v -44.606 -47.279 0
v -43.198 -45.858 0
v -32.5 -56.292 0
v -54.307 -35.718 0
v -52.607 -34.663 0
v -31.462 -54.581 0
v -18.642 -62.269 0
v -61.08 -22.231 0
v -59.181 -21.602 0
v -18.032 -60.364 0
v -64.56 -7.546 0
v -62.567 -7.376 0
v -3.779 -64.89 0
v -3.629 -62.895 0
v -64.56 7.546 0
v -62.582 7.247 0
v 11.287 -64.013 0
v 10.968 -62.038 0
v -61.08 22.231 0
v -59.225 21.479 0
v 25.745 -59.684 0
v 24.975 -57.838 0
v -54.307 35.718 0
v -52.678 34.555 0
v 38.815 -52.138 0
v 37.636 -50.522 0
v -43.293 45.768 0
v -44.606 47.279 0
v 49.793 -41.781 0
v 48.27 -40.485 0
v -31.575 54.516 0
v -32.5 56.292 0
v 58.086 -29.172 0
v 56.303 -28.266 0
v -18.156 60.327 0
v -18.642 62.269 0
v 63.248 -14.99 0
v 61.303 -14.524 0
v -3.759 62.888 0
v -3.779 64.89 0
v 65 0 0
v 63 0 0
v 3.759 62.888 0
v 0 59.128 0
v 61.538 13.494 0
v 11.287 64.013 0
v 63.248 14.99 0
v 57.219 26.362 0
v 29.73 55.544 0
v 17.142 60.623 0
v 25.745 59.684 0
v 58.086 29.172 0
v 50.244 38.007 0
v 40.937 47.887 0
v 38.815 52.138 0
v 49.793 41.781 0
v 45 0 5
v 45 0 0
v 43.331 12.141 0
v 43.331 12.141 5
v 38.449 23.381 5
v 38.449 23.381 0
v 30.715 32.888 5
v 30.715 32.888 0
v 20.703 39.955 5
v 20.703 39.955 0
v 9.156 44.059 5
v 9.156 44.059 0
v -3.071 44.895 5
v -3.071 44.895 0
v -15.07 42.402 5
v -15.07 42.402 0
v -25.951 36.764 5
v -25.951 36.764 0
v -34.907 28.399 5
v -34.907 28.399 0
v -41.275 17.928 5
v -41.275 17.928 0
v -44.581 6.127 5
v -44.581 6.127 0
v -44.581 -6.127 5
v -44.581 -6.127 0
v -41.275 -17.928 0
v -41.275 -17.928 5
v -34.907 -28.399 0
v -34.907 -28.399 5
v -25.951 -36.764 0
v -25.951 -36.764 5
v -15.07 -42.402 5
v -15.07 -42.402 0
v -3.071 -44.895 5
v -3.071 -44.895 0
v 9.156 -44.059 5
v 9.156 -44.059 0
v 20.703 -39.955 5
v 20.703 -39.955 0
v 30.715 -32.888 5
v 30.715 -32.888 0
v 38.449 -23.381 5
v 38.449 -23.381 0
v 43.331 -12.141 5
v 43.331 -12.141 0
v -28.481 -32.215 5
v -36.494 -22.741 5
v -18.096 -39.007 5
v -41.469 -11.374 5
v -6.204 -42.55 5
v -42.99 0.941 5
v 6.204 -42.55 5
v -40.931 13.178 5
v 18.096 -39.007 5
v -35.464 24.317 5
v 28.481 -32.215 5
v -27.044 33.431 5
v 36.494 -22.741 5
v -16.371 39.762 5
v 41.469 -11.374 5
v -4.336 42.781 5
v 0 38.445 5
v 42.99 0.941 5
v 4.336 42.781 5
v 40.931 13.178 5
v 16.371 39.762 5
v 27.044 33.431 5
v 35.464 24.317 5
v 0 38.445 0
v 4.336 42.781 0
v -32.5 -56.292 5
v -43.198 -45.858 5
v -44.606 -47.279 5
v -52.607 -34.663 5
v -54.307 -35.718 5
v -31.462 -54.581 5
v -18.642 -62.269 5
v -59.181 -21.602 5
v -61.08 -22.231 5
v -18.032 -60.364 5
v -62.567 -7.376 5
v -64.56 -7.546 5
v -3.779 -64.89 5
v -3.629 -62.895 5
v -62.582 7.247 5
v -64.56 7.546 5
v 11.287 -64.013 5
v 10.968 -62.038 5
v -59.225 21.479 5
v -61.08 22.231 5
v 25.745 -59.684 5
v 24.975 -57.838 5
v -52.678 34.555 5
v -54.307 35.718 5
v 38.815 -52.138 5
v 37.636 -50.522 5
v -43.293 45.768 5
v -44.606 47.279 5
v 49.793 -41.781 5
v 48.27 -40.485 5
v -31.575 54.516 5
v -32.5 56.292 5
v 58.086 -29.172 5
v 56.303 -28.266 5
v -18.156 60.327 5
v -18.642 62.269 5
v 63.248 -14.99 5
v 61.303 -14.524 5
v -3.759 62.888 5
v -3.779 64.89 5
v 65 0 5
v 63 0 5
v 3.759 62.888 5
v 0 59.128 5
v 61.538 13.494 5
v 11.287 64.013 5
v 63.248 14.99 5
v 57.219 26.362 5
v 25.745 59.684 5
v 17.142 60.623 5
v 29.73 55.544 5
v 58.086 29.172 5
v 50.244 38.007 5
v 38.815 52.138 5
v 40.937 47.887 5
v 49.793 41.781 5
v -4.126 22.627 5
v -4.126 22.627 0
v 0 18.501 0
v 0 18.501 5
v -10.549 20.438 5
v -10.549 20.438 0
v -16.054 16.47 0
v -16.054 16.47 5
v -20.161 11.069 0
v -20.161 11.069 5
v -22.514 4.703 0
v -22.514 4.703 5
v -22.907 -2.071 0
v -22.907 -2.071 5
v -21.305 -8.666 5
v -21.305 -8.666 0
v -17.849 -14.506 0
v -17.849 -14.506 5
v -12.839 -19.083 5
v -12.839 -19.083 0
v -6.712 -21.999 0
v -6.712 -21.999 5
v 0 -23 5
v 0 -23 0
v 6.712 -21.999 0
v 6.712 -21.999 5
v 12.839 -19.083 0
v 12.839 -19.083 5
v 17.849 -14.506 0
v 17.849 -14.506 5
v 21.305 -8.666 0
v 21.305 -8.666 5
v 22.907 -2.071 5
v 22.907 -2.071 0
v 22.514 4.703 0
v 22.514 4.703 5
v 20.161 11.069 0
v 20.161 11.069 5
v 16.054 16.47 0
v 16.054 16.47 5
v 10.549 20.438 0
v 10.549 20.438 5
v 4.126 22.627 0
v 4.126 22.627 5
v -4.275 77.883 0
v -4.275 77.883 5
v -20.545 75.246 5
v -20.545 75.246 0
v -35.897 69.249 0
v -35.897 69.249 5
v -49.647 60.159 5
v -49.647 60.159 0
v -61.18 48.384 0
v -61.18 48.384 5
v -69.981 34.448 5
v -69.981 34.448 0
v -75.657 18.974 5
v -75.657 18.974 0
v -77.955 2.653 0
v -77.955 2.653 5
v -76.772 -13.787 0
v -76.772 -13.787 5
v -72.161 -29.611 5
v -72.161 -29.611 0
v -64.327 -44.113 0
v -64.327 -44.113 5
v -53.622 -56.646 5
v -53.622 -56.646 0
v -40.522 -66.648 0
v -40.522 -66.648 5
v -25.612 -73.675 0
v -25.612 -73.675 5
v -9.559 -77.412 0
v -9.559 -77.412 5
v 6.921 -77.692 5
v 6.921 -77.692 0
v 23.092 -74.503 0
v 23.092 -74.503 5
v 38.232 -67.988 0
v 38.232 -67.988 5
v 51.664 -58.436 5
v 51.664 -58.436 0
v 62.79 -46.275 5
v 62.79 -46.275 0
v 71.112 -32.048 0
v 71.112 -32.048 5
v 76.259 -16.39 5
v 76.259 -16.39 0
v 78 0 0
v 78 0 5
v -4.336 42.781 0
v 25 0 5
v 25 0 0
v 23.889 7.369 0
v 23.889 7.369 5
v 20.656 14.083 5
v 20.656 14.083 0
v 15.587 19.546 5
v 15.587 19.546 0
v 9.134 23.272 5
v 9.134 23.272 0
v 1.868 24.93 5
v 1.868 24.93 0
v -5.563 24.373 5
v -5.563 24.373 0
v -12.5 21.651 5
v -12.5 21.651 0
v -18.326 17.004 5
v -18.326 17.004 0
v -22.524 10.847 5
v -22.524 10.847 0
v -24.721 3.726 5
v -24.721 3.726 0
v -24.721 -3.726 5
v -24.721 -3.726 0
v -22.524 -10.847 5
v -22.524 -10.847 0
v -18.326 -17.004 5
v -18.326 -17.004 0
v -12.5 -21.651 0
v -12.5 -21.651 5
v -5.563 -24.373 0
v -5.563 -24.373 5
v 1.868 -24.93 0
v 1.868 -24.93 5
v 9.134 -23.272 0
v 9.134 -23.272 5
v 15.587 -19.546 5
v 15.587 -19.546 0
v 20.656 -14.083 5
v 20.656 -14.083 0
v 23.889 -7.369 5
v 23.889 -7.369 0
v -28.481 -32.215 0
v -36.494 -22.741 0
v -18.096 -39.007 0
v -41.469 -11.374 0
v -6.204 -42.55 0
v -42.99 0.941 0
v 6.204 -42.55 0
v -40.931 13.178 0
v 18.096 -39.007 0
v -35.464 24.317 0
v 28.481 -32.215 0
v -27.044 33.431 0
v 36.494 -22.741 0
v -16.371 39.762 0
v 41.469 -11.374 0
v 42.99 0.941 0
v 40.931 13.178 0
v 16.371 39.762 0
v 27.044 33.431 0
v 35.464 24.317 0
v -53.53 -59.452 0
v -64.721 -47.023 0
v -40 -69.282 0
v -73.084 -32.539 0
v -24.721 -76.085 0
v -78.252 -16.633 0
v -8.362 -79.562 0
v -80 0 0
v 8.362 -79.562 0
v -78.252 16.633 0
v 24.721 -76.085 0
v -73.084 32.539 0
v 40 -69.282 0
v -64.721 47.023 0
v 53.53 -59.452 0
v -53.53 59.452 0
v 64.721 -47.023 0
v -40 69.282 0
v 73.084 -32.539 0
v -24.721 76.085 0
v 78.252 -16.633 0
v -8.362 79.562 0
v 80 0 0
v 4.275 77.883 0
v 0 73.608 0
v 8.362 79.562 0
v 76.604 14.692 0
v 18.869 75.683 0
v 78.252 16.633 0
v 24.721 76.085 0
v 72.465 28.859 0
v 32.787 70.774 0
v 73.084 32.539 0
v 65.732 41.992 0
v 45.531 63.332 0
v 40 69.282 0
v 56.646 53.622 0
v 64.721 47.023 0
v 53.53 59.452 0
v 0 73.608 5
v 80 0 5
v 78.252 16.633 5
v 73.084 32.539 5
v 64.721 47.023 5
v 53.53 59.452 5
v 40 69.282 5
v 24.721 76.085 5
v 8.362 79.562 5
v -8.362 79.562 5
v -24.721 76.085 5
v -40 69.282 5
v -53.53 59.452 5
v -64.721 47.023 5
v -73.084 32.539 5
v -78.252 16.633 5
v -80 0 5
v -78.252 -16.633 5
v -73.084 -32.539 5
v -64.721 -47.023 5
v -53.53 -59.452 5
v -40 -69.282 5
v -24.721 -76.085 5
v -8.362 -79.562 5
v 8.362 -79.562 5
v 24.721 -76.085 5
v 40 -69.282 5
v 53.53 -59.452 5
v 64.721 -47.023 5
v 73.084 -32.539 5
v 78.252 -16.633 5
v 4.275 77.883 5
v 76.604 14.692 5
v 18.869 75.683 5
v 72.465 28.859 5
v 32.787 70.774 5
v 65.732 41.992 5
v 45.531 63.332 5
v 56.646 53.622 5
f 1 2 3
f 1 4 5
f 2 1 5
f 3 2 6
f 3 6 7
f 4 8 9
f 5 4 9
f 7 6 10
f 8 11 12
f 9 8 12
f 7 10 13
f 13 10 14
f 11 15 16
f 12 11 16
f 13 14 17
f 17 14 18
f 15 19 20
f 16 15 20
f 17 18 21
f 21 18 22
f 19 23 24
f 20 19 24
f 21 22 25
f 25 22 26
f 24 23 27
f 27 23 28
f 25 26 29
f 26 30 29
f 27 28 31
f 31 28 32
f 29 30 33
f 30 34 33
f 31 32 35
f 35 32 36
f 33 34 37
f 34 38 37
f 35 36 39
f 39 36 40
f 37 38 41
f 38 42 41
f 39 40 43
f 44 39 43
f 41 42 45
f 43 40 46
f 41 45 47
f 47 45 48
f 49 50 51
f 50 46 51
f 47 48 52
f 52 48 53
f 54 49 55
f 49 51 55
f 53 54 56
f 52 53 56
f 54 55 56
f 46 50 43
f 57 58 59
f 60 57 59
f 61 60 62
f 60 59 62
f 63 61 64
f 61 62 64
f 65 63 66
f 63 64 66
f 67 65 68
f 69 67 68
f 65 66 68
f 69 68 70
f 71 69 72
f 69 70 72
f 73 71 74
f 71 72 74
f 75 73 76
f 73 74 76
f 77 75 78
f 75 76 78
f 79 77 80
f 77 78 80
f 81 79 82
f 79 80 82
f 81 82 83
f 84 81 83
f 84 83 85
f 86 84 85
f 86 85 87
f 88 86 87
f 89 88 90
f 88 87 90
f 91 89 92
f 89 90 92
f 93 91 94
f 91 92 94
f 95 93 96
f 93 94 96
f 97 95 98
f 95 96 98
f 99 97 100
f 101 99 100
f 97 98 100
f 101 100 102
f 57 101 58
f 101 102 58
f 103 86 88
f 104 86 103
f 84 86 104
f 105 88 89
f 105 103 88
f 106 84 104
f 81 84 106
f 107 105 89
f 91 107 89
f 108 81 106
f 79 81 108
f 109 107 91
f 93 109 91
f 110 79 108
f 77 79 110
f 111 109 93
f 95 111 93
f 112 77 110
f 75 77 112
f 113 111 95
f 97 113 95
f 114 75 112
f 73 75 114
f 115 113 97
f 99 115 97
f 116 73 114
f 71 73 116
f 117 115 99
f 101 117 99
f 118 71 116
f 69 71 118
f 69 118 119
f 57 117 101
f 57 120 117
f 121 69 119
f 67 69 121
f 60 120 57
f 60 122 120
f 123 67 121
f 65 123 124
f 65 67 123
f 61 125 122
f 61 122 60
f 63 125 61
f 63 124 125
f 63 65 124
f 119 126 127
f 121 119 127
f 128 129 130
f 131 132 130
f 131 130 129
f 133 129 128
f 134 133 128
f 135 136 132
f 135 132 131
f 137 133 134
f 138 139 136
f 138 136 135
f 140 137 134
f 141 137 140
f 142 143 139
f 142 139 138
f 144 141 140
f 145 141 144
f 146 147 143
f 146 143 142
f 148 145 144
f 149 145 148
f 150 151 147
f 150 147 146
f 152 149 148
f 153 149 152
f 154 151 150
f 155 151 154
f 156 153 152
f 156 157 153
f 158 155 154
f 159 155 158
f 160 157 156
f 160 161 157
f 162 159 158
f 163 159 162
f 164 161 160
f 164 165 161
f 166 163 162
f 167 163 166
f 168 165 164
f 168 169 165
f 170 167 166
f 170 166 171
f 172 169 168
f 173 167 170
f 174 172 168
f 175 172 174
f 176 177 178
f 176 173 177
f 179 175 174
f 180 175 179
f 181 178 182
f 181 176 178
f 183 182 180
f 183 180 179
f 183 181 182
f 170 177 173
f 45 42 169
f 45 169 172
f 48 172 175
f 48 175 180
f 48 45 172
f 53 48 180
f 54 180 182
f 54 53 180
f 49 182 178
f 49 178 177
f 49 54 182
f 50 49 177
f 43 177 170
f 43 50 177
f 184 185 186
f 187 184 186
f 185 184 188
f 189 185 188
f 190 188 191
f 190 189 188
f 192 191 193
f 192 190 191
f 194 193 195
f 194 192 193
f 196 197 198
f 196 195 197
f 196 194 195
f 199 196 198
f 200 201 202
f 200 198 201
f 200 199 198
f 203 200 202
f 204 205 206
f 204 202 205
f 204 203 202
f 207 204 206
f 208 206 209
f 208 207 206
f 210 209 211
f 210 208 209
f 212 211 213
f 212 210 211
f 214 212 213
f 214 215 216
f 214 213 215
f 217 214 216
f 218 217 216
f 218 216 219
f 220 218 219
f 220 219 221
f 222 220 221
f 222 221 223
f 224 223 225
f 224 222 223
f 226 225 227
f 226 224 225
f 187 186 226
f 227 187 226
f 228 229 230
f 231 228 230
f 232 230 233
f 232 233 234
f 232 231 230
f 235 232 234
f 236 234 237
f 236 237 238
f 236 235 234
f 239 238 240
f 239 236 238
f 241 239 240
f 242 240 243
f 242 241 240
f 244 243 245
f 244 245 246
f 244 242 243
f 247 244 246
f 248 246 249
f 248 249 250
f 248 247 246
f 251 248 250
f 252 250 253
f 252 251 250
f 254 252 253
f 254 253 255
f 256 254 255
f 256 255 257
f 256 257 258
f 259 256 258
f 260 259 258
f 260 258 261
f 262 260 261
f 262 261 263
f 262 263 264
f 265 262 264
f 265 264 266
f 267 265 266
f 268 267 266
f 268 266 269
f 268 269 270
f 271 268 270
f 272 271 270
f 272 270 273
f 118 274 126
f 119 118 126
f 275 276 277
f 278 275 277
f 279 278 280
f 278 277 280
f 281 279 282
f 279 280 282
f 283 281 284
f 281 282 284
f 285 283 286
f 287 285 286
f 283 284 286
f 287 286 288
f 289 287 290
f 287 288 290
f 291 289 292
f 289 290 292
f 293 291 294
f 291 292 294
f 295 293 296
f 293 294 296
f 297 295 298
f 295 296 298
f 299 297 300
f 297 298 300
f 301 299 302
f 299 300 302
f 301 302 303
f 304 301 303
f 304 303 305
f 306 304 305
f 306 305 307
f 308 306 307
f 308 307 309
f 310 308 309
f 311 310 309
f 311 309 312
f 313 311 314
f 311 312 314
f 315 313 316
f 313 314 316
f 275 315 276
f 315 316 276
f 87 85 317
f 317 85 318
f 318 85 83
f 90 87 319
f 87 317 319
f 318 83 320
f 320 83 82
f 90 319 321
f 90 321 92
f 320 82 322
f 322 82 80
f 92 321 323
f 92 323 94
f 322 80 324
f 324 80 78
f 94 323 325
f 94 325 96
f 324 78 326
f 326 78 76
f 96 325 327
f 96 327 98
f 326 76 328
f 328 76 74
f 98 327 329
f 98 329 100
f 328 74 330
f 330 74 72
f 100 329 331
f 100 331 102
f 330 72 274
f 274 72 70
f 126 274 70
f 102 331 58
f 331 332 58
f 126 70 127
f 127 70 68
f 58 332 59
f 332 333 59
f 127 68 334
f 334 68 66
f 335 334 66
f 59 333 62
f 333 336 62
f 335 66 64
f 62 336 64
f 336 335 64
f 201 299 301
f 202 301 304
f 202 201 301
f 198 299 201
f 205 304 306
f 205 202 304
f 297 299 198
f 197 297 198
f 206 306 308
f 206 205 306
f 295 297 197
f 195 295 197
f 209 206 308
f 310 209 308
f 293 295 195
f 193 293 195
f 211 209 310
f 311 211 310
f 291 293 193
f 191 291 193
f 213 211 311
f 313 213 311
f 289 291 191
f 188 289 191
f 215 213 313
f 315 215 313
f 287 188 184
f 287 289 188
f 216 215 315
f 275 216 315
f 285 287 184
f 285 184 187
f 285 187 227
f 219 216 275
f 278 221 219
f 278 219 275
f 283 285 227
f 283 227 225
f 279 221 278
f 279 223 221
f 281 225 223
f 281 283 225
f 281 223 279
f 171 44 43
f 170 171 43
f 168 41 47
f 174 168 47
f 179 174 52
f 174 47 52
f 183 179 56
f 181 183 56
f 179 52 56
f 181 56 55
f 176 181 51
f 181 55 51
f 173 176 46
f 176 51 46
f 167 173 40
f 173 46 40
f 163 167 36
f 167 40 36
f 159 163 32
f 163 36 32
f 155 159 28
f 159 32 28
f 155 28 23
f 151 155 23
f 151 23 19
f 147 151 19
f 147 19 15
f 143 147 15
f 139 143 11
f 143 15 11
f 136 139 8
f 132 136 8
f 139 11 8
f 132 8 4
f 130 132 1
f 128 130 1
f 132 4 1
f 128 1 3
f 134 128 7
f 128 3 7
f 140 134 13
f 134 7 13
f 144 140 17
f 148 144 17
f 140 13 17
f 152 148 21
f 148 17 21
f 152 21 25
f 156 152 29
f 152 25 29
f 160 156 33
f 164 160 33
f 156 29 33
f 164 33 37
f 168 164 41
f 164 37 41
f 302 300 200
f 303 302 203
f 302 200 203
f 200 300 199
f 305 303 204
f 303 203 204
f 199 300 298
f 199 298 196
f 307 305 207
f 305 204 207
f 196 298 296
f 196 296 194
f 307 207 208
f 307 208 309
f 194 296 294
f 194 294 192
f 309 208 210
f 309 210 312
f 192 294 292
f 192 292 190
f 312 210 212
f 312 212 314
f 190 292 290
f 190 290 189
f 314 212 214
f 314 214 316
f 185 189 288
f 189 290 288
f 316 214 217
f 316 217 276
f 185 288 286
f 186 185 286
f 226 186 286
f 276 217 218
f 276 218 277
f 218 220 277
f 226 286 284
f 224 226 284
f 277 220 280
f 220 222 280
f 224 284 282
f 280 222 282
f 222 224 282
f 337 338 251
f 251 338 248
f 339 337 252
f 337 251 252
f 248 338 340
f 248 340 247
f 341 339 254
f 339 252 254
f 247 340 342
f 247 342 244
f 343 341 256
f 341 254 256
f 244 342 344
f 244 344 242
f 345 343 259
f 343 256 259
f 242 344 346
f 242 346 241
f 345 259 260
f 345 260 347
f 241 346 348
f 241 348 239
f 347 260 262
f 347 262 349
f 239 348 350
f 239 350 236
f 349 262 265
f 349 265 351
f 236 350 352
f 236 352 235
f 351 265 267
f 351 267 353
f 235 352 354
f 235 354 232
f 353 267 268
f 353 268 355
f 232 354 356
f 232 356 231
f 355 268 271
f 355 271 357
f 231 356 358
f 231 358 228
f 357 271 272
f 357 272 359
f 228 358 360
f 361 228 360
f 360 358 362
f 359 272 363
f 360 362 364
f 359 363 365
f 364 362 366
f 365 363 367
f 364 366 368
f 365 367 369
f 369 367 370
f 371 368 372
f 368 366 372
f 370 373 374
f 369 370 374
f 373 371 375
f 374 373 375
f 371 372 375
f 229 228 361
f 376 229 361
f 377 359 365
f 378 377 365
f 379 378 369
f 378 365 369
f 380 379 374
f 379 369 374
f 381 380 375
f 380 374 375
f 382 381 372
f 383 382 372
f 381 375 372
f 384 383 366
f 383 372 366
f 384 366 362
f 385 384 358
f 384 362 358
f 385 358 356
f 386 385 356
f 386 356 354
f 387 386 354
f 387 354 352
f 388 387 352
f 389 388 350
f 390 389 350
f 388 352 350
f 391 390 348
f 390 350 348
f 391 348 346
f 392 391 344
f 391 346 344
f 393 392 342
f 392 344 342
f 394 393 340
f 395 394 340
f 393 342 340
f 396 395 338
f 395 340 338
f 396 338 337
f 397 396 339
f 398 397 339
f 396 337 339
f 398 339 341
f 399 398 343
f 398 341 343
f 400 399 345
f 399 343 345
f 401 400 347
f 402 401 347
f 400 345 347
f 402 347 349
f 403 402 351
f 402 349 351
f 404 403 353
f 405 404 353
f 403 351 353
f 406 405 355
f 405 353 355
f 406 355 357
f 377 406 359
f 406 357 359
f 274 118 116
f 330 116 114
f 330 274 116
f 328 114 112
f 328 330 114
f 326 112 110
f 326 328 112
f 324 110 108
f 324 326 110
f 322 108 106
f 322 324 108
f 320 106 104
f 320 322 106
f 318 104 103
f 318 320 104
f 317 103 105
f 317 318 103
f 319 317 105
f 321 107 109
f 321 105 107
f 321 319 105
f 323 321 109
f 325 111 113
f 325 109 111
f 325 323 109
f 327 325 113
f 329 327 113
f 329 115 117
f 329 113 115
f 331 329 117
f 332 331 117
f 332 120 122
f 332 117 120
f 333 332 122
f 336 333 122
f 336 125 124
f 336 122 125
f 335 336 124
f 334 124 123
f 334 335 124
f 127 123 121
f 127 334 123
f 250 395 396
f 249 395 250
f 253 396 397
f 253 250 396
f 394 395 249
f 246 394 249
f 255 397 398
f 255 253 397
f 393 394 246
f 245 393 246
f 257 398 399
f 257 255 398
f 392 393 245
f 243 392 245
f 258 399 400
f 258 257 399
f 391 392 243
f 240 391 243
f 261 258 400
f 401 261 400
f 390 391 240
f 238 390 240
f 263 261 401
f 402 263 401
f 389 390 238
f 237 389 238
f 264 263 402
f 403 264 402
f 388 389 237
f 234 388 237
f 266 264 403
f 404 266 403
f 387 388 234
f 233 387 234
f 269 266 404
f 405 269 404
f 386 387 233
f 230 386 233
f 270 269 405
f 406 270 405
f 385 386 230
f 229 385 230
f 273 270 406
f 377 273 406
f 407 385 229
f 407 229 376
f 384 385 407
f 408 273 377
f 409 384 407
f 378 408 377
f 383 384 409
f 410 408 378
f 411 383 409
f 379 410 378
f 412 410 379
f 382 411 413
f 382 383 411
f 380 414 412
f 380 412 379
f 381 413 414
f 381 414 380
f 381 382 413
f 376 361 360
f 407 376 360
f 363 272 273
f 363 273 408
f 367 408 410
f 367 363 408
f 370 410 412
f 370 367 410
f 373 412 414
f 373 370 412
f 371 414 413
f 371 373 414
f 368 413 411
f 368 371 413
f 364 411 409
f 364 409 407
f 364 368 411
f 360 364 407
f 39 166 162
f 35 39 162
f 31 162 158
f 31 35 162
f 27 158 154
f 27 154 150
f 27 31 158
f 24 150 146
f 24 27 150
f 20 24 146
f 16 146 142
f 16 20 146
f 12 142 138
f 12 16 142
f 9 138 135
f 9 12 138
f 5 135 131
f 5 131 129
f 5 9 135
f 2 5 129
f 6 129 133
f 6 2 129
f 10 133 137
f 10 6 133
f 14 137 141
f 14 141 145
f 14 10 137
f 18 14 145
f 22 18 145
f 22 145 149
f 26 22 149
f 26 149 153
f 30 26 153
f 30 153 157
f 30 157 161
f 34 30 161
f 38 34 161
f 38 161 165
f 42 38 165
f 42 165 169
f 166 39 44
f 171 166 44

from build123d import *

# Parameters (mm, degrees)
F2_DEPTH = 5
F3_R     = 25
F3_R_2   = 23
F4_DEPTH = 5
F3_R_3   = 45
F3_R_4   = 43
F3_R_5   = 80
F3_R_6   = 78
F3_R_7   = 65
F3_R_8   = 63


with BuildPart() as f2:
    # F1 (on Top) → F2 (new body)
    with BuildSketch(Plane.XY):
        Polygon((0, 73.6079147614), (0, 78.6079147614), (-5.1205901883, 78.7285049497), align=None)
        Polygon((5, 78.6079147614), (0, 78.6079147614), (0, 73.6079147614), align=None)
    extrude(amount=F2_DEPTH)

    # F3 (on Top) → F4, piece 3 (join)
    with BuildSketch(Plane.XY):
        Circle(F3_R_5)
        Circle(F3_R_6, mode=Mode.SUBTRACT)
    extrude(amount=F4_DEPTH)


with BuildPart() as f2b:
    # F1 (on Top) → F2, piece 2 (new body)
    with BuildSketch(Plane.XY):
        Polygon((4.4469106392, 63.5754074351), (0, 64.1284967959), (0, 59.1284967959), align=None)
        Polygon((0, 59.1284967959), (0, 64.1284967959), (-4.4469106392, 63.5754074351), align=None)
    extrude(amount=F2_DEPTH)

    # F3 (on Top) → F4, piece 4 (join)
    with BuildSketch(Plane.XY):
        Circle(F3_R_7)
        Circle(F3_R_8, mode=Mode.SUBTRACT)
    extrude(amount=F4_DEPTH)


with BuildPart() as f2c:
    # F1 (on Top) → F2, piece 3 (new body)
    with BuildSketch(Plane.XY):
        Polygon((0, 38.445033133), (0, 43.445033133), (-5.3175765089, 43.7626096419), align=None)
        Polygon((5, 43.445033133), (0, 43.445033133), (0, 38.445033133), align=None)
    extrude(amount=F2_DEPTH)

    # F3 (on Top) → F4, piece 2 (join)
    with BuildSketch(Plane.XY):
        Circle(F3_R_3)
        Circle(F3_R_4, mode=Mode.SUBTRACT)
    extrude(amount=F4_DEPTH)


with BuildPart() as f2d:
    # F1 (on Top) → F2, piece 4 (new body)
    with BuildSketch(Plane.XY):
        Polygon((0, 18.5014363378), (0, 23.5014363378), (-5, 23.5014363378), align=None)
        Polygon((4.5980428482, 23.0994791861), (0, 23.5014363378), (0, 18.5014363378), align=None)
    extrude(amount=F2_DEPTH)

    # F3 (on Top) → F4 (join)
    with BuildSketch(Plane.XY):
        Circle(F3_R)
        Circle(F3_R_2, mode=Mode.SUBTRACT)
    extrude(amount=F4_DEPTH)


solid = Compound([f2.part, f2b.part, f2c.part, f2d.part])
